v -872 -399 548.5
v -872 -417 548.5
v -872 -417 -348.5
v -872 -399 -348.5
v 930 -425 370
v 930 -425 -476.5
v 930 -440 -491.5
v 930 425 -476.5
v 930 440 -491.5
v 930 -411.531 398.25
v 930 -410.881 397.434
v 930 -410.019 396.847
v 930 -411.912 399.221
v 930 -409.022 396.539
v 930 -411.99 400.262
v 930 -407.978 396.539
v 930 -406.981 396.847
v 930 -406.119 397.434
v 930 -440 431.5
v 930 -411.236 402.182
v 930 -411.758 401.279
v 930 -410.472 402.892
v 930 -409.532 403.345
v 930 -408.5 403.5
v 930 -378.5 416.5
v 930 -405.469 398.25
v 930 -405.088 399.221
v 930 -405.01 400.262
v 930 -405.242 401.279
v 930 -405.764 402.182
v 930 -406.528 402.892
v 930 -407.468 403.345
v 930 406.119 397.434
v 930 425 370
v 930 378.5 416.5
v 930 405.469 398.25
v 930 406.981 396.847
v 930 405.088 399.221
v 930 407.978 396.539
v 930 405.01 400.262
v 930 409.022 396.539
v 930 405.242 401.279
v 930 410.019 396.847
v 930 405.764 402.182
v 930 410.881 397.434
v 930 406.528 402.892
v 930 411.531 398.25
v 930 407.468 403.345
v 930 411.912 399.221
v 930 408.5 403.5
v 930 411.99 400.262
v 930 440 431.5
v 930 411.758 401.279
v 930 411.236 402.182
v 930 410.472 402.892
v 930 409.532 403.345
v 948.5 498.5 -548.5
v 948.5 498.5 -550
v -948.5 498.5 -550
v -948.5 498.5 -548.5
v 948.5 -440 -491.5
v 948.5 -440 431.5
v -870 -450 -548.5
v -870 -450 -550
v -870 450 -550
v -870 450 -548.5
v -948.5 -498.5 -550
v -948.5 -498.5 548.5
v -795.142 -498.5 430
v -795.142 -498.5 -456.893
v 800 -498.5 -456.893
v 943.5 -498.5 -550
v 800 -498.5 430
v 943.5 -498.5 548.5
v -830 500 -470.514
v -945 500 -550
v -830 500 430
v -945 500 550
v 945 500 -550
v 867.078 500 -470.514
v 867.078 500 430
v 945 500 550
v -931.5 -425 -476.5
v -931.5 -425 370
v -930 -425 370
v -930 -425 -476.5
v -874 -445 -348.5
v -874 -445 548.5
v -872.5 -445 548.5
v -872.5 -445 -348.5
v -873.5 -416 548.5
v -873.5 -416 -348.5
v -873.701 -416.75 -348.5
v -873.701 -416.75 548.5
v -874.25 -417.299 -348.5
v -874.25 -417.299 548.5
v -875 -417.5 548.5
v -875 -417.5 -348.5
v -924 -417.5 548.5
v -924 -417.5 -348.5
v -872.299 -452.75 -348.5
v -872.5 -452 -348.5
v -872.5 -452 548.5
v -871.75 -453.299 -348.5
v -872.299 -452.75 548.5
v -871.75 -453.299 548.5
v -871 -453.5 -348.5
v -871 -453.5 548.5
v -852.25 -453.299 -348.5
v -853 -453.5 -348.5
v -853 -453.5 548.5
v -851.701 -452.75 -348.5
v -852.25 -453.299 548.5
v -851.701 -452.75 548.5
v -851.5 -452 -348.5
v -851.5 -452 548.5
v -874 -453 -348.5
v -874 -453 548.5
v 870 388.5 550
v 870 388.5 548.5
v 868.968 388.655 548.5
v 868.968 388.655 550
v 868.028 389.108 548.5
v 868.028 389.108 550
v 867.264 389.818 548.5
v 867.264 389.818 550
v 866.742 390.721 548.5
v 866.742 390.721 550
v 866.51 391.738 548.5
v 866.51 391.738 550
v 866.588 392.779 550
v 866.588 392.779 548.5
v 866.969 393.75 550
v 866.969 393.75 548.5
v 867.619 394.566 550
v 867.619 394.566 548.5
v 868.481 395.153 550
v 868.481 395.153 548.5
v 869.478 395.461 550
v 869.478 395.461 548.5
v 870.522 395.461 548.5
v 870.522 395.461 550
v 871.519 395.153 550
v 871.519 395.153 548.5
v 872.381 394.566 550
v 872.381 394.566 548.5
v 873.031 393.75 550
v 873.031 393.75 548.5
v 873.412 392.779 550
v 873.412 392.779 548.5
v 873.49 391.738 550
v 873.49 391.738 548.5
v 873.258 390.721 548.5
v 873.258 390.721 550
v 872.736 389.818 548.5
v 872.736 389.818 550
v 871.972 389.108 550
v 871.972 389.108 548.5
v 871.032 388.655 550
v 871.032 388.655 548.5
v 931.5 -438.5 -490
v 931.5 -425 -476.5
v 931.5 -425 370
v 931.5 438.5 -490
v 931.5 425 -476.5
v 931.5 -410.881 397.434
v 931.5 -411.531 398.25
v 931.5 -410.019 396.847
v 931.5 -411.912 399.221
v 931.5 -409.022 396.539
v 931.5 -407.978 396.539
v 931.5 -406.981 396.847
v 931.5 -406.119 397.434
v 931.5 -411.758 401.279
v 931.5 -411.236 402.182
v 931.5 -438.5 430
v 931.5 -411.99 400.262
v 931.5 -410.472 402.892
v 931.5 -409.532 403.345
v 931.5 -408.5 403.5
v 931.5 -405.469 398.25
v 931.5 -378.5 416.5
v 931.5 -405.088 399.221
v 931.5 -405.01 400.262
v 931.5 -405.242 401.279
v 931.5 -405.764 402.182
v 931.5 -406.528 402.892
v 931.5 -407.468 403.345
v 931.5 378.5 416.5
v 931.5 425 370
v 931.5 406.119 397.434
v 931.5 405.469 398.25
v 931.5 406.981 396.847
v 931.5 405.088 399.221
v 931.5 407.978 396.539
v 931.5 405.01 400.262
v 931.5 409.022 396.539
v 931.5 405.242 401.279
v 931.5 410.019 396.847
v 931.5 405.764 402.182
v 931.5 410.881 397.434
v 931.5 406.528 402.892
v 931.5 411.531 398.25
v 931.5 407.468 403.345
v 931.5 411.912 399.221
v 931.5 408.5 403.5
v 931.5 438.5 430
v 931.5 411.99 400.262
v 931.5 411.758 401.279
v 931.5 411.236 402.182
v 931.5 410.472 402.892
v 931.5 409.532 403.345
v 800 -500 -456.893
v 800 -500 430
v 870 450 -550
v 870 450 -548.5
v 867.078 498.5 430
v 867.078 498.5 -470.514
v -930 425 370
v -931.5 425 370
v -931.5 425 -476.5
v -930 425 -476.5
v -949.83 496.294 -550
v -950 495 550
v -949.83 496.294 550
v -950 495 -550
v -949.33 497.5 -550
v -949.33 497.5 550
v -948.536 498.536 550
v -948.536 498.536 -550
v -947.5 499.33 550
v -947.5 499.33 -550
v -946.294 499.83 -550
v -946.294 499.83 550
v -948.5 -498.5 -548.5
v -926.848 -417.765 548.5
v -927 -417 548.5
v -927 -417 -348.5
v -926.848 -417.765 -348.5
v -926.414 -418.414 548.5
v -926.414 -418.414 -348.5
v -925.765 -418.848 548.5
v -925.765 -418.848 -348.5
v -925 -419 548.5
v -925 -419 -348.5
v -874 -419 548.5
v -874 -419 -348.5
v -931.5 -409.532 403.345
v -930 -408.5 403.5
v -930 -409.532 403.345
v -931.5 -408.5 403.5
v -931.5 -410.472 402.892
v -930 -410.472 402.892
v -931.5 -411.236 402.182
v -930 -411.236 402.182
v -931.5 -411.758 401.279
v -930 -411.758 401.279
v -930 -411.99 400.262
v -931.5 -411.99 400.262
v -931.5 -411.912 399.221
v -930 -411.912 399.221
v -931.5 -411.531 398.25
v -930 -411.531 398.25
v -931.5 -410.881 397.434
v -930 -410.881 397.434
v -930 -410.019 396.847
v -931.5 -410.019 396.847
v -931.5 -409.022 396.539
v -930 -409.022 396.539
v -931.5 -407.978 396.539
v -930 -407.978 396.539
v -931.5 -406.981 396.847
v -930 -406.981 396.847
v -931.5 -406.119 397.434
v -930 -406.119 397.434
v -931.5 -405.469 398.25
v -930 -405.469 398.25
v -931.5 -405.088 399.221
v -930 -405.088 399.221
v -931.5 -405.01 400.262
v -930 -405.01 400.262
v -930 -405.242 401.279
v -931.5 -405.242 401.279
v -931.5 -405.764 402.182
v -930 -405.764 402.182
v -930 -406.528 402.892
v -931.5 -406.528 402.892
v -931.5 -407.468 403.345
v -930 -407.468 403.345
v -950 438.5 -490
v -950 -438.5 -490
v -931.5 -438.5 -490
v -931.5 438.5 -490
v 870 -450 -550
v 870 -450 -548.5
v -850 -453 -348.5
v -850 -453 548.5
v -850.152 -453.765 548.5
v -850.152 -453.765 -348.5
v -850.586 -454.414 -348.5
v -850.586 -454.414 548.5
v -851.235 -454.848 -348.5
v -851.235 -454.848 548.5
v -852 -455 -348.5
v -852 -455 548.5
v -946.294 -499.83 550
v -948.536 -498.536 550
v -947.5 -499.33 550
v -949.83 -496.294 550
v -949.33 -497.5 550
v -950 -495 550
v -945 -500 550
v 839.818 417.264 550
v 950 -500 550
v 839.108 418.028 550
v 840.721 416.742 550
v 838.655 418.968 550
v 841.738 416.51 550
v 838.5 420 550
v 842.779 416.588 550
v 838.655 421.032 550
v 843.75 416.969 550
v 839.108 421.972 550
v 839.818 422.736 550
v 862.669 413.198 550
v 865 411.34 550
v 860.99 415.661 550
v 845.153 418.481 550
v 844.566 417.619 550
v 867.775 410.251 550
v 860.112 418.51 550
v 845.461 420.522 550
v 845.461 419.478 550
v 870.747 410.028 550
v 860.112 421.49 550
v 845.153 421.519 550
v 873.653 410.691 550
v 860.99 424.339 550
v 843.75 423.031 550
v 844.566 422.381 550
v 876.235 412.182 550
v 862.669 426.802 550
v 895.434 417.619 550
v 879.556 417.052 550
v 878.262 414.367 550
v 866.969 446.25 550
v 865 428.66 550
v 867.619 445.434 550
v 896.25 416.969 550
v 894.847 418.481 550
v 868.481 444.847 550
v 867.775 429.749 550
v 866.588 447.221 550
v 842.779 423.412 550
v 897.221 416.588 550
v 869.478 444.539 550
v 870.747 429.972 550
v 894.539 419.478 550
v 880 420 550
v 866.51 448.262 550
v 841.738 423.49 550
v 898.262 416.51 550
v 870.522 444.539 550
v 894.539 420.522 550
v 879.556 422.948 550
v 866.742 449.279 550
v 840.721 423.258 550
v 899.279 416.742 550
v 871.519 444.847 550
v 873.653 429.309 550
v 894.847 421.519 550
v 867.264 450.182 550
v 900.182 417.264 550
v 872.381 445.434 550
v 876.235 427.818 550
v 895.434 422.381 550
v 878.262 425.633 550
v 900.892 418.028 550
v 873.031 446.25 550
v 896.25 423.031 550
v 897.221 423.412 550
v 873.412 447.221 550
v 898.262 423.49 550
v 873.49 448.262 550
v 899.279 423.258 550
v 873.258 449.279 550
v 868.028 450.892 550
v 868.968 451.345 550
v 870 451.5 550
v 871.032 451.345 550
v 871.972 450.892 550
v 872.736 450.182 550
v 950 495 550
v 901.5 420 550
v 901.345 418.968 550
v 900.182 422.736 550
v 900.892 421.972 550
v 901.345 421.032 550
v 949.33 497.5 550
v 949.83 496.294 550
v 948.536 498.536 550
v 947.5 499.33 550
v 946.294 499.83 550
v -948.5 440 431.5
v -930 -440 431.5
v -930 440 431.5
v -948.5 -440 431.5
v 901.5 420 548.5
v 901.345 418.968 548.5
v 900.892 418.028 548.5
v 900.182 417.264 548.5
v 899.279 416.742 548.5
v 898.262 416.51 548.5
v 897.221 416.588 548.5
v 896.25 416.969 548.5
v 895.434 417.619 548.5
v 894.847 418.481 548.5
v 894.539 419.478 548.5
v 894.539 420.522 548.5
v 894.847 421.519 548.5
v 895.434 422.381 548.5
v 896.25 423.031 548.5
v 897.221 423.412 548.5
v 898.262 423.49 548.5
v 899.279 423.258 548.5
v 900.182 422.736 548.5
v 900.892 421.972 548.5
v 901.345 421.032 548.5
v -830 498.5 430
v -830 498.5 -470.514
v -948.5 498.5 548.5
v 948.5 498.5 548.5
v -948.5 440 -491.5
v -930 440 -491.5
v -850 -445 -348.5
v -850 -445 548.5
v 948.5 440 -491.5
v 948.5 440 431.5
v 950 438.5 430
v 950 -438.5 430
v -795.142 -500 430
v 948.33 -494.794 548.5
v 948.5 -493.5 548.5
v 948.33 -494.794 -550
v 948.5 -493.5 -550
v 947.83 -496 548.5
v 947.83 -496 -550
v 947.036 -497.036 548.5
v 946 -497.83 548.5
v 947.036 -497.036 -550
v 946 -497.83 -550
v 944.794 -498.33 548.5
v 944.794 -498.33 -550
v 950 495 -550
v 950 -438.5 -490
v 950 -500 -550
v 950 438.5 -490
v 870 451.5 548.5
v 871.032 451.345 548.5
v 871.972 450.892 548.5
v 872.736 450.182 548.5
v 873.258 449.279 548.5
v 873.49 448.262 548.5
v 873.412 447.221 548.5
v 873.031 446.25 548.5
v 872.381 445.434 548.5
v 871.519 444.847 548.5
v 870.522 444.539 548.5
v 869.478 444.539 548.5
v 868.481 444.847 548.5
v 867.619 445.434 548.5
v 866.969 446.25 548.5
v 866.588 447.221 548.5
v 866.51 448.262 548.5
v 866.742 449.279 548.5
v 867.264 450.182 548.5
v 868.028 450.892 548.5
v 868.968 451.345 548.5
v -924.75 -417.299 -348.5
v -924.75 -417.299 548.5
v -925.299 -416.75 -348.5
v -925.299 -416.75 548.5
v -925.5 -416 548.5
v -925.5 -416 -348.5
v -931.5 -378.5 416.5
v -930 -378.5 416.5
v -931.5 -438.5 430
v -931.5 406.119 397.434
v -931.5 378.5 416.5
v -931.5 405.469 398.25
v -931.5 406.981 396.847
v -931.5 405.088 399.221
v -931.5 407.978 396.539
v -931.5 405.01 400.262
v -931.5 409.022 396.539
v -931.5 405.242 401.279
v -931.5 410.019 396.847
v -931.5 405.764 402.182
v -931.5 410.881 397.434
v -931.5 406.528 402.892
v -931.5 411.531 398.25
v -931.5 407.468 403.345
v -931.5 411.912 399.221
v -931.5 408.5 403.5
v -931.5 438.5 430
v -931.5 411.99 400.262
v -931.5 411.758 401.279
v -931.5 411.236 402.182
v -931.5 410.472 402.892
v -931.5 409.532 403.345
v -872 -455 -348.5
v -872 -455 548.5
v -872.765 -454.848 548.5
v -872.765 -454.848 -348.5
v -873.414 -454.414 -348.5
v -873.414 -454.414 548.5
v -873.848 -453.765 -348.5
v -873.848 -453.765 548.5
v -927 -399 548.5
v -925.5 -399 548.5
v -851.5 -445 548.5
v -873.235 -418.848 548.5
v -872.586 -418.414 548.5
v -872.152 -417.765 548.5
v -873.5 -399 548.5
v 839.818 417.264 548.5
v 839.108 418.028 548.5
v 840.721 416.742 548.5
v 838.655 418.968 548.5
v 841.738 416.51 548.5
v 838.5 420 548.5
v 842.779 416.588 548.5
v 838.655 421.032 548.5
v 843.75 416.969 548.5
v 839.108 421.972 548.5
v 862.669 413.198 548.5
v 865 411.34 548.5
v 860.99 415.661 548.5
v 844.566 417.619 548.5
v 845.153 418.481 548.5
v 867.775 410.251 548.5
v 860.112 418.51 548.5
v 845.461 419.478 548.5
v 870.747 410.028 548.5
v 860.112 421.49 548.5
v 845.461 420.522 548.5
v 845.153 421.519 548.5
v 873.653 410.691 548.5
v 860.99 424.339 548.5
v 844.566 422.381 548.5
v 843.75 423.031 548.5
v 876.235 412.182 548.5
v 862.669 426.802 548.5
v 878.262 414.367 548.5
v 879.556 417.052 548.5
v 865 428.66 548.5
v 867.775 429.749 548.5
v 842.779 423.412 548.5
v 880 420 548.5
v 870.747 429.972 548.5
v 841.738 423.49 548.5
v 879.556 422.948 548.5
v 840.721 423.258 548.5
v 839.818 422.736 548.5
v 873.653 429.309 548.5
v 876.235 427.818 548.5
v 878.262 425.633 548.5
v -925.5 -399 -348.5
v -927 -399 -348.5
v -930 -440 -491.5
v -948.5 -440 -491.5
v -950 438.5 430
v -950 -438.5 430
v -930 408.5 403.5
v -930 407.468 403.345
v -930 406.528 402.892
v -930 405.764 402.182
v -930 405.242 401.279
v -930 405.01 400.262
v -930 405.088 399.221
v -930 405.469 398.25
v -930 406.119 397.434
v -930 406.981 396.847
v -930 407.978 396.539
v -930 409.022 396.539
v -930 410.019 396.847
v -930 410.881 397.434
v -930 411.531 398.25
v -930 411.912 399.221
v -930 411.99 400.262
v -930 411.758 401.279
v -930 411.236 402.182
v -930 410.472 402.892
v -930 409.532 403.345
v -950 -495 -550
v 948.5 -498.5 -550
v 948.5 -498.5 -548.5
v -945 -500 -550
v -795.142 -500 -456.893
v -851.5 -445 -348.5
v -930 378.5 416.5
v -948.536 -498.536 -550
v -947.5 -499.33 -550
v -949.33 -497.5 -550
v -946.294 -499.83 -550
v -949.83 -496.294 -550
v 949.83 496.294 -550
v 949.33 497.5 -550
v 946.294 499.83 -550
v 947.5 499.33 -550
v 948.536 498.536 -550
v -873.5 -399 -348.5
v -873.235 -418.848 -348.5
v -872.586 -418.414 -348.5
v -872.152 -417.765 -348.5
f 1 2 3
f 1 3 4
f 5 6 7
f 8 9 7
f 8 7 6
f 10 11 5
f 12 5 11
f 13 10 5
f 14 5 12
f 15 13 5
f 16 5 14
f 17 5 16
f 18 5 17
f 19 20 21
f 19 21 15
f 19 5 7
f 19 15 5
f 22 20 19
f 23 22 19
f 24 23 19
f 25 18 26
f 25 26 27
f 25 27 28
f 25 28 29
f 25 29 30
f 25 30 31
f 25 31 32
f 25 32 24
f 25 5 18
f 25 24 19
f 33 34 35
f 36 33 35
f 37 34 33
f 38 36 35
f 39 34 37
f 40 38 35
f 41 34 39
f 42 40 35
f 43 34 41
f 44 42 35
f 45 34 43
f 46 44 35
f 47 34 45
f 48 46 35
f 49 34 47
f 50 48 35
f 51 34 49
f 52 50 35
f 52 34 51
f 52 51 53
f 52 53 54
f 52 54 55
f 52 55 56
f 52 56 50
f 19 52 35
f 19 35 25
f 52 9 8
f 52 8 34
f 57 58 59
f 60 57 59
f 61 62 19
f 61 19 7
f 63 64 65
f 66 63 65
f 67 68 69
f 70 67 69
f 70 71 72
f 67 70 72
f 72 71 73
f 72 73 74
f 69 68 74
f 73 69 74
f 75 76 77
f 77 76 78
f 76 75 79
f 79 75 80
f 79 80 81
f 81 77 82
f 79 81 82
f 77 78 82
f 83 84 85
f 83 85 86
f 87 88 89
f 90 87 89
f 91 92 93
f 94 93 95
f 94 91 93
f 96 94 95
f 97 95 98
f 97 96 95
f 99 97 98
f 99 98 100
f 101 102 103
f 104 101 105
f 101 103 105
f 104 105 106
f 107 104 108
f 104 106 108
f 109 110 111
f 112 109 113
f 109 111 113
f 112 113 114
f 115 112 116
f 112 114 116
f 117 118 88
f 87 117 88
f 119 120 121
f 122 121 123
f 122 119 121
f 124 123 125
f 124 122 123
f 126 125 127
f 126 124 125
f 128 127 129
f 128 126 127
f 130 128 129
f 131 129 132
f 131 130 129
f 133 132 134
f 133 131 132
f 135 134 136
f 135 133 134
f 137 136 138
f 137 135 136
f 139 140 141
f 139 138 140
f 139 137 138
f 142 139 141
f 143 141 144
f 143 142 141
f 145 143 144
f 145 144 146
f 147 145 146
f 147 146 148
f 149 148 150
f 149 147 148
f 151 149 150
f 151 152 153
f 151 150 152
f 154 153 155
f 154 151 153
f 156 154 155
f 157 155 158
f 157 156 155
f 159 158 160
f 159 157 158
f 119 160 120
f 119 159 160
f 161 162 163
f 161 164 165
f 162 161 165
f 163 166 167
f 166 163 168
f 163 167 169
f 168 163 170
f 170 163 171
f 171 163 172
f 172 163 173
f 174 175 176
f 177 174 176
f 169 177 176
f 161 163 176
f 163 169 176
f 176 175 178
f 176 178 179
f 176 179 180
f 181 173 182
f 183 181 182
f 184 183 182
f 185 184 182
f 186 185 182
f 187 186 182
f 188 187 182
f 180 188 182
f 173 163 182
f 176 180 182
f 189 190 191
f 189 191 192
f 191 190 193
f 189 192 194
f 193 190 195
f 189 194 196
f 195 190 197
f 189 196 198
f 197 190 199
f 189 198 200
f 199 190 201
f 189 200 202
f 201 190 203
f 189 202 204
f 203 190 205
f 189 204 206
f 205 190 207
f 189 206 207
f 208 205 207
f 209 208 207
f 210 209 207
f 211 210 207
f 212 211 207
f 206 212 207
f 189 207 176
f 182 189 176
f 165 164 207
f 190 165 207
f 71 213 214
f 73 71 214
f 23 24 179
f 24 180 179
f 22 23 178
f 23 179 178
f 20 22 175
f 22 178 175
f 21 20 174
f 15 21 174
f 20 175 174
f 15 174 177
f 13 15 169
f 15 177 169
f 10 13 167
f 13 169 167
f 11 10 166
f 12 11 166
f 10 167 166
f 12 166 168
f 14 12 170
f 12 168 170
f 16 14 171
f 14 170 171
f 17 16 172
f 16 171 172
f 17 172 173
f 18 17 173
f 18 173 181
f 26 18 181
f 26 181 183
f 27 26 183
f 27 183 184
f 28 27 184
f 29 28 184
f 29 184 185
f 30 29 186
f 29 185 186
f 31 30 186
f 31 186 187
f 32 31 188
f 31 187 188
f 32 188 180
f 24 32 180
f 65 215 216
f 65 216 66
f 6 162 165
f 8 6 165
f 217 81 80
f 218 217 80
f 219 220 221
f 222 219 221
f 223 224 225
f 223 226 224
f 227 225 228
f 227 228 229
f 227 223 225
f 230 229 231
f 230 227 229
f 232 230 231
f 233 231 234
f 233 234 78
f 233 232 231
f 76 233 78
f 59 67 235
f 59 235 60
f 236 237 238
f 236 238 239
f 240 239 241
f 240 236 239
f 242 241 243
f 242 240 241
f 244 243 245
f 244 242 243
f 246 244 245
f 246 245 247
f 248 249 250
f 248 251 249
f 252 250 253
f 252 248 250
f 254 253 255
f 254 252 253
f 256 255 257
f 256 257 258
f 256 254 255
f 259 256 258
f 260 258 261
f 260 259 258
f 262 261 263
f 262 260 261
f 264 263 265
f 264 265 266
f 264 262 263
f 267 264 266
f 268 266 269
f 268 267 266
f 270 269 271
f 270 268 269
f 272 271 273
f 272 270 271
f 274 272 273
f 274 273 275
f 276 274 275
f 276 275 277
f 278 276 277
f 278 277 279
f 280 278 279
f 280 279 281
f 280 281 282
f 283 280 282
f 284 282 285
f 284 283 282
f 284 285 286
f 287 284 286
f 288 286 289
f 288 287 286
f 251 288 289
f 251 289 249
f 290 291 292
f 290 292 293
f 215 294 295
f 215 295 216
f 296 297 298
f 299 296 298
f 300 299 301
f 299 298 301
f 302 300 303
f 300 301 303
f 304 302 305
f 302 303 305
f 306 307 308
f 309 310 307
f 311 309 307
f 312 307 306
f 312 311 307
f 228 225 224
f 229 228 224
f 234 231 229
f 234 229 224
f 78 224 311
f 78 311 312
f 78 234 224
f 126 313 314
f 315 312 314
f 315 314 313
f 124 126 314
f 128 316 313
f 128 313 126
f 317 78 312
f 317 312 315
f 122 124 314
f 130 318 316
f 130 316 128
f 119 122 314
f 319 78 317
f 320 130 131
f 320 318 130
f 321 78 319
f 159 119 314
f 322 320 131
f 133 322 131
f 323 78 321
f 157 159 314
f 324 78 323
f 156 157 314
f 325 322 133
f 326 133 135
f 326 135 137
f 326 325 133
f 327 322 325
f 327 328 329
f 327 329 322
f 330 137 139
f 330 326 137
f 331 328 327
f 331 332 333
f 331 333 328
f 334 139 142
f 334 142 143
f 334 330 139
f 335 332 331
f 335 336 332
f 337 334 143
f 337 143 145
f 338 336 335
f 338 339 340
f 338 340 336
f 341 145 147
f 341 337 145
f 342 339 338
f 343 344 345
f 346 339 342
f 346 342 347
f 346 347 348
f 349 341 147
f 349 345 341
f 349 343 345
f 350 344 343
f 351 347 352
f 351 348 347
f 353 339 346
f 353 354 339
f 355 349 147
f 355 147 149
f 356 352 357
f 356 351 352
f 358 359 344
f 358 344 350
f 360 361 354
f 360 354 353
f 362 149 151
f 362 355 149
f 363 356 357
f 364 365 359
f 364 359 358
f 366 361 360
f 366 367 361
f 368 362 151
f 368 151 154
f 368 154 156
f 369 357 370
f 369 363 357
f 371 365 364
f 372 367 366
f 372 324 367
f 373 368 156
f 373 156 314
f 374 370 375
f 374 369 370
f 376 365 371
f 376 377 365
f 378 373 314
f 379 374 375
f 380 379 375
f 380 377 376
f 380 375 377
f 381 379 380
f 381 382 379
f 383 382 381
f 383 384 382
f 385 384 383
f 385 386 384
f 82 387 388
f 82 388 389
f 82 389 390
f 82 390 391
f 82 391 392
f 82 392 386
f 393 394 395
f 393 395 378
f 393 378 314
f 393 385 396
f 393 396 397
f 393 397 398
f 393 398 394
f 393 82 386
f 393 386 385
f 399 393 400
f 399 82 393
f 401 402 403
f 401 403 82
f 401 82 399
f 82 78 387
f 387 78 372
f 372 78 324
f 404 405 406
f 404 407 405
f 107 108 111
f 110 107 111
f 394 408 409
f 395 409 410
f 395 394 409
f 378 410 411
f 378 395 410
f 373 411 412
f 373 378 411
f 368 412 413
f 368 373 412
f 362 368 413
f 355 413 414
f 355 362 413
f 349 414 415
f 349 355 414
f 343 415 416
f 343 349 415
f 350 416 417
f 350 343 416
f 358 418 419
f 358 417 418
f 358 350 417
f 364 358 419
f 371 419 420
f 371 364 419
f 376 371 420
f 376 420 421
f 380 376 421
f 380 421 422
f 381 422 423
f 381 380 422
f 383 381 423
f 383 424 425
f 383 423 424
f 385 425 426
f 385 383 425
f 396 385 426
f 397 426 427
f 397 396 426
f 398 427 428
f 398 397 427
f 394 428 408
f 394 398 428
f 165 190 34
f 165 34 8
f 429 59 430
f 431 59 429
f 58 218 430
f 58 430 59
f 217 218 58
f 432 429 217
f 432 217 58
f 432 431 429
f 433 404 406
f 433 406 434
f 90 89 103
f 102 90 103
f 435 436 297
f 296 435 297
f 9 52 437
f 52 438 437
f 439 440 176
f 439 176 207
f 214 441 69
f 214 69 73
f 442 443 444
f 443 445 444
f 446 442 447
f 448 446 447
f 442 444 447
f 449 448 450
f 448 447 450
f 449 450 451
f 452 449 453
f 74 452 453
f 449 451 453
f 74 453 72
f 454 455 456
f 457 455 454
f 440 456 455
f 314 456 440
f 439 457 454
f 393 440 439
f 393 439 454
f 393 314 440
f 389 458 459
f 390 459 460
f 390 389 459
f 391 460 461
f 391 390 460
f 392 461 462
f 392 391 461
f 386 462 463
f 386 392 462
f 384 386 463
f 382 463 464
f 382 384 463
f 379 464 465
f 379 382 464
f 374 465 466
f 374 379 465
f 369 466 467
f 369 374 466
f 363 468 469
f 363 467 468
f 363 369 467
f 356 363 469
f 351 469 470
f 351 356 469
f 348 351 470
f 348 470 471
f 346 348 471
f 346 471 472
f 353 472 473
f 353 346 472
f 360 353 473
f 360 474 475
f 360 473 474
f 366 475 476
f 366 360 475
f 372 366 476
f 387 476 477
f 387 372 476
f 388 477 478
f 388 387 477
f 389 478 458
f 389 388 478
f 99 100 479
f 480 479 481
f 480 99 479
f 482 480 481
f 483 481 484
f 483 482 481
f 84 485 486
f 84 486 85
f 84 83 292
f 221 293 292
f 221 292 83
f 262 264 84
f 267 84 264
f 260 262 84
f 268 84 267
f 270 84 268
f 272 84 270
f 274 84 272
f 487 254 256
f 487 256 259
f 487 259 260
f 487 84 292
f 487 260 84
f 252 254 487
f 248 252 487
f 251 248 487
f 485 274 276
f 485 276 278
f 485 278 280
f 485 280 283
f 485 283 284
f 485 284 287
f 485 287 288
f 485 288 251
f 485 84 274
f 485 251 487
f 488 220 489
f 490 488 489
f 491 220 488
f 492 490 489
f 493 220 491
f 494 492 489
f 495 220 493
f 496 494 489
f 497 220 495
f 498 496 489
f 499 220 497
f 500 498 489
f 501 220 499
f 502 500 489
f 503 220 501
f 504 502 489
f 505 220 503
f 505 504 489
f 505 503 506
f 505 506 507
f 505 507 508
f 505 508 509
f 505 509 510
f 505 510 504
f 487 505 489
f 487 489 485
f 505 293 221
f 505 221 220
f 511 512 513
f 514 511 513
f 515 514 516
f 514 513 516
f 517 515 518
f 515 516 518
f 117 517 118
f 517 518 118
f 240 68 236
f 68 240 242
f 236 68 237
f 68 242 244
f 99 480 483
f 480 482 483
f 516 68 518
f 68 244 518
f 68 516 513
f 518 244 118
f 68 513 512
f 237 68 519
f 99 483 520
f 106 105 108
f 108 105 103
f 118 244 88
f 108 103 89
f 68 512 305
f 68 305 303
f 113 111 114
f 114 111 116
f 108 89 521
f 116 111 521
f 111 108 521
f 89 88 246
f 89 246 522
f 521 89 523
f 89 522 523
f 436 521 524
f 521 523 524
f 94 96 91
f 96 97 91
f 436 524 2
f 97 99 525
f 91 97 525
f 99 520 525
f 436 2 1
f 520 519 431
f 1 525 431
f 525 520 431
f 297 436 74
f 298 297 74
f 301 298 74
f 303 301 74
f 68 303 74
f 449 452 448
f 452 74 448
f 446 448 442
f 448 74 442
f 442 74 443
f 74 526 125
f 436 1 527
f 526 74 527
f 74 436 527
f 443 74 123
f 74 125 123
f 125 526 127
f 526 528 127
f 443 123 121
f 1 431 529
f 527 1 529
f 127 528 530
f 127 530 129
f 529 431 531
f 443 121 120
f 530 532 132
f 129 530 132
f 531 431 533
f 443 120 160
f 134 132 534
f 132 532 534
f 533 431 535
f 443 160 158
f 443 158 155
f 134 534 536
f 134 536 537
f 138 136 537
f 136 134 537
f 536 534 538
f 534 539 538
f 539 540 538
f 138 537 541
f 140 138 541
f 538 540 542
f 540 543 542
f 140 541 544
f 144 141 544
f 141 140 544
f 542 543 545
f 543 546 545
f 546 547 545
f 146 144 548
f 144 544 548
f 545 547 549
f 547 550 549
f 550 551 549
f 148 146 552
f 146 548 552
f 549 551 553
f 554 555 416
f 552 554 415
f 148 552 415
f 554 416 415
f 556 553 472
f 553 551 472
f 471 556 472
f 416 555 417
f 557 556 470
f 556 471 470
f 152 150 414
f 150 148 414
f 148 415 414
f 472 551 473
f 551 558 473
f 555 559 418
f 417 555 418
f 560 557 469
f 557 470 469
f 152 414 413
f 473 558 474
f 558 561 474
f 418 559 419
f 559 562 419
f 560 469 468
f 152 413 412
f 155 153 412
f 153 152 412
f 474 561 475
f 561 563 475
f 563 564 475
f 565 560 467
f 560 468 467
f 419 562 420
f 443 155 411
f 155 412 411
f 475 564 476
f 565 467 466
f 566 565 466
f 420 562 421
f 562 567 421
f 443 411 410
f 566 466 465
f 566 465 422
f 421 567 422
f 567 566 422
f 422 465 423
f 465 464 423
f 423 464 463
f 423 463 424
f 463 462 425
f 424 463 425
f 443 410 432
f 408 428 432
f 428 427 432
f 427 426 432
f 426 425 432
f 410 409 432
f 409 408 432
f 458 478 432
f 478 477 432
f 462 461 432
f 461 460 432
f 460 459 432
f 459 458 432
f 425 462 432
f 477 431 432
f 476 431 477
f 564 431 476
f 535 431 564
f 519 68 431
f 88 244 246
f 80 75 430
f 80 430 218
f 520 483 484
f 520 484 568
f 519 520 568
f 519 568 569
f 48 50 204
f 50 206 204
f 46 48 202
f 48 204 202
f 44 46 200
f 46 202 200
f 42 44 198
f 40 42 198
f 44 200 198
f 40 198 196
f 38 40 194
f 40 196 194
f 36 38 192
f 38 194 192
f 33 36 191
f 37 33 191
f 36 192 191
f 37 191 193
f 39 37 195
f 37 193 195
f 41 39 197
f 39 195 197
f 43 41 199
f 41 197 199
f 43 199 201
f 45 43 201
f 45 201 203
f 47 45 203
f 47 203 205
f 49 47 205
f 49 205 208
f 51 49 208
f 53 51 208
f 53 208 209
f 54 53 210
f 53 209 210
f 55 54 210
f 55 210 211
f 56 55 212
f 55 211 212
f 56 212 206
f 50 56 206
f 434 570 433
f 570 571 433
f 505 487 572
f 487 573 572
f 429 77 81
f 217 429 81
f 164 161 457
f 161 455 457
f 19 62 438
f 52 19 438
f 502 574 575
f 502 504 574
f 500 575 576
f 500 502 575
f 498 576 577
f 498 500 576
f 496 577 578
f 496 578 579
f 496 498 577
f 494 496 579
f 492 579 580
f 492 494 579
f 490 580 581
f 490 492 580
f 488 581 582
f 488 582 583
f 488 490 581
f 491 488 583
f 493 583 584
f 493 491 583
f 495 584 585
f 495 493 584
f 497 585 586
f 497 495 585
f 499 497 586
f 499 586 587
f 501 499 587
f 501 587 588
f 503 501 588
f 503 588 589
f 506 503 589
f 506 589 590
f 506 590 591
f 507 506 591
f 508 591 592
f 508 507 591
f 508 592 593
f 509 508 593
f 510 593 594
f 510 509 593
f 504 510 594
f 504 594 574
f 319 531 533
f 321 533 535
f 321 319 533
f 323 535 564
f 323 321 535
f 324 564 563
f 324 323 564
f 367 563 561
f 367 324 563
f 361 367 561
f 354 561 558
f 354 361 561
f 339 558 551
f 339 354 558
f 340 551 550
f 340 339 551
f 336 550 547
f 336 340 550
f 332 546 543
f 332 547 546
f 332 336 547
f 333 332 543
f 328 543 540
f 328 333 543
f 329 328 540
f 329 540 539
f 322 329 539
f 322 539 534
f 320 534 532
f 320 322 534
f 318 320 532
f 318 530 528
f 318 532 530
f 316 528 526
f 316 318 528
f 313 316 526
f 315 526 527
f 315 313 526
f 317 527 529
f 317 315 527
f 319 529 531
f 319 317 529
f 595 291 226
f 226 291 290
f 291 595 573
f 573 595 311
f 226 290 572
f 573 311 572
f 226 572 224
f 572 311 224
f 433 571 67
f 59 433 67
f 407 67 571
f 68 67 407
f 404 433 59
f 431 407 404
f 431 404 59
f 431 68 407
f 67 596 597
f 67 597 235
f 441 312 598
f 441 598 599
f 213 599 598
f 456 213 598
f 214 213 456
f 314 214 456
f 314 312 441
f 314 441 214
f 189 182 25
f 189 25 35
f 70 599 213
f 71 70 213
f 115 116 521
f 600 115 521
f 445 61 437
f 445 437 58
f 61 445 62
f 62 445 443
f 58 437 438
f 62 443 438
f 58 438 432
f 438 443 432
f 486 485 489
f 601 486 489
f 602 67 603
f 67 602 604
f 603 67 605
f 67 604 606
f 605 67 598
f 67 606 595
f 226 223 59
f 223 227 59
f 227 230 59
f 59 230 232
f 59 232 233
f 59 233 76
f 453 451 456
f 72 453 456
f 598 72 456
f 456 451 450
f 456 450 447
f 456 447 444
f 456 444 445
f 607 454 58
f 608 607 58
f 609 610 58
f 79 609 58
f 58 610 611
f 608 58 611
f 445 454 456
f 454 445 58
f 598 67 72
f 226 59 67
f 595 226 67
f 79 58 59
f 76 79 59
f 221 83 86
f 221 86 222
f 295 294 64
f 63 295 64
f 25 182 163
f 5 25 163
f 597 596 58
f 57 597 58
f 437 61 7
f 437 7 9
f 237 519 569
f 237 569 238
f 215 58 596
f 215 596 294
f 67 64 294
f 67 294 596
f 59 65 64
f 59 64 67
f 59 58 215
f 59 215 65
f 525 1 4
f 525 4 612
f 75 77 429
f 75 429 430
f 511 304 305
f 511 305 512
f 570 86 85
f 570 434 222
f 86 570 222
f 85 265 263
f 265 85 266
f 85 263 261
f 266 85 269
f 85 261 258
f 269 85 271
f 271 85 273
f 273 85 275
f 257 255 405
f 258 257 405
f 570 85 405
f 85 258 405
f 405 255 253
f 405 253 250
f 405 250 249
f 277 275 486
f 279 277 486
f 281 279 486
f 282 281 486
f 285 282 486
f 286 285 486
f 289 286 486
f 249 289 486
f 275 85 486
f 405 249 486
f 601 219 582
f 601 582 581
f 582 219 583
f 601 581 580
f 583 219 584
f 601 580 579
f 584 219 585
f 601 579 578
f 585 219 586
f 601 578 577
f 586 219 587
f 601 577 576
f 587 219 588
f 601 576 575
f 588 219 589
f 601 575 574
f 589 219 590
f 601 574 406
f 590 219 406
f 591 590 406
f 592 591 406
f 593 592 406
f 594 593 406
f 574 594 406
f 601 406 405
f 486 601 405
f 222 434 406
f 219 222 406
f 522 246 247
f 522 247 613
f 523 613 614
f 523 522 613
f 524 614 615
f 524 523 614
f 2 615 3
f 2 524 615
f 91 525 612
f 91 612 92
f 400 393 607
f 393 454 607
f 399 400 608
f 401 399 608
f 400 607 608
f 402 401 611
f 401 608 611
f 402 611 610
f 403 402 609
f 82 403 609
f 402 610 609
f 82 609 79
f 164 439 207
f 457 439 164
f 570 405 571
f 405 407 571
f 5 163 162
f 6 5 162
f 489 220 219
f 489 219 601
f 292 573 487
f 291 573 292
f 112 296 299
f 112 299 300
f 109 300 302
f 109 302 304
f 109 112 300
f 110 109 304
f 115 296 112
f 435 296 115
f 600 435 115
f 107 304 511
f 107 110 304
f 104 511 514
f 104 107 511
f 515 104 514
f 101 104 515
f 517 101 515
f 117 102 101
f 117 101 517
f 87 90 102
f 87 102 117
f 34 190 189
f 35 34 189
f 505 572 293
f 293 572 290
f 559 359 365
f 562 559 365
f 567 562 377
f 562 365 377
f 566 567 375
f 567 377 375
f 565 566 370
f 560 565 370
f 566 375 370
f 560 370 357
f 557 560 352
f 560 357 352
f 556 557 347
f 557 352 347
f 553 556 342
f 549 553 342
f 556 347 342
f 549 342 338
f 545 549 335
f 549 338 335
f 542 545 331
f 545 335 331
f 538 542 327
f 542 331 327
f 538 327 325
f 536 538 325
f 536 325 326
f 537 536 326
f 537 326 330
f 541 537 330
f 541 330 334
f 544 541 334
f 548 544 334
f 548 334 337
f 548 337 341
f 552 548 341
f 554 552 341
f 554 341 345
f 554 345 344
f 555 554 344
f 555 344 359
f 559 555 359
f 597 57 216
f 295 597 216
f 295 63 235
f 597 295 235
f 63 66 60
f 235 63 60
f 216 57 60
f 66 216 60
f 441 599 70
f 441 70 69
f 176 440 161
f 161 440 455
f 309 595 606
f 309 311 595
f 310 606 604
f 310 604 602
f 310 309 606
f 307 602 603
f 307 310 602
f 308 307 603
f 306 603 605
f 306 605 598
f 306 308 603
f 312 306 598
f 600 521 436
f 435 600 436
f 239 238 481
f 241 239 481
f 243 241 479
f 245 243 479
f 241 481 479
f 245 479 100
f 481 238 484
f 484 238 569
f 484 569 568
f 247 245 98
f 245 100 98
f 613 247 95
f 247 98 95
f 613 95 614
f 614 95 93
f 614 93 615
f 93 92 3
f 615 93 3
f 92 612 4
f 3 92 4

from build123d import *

# Parameters (mm, degrees)
SKETCH_1_W                     = 1900
SKETCH_1_H                     = 1000
EXTRUDE_1_DEPTH                = 550
SHELL_1_T                      = -1.5
SKETCH_2_W                     = 1897
SKETCH_2_H                     = 997
SKETCH_2_W_2                   = 1740
SKETCH_2_H_2                   = 900
EXTRUDE_2_DEPTH                = 1.5
FILLET_1_R                     = 5
SKETCH_9_R                     = 10
CUT_EXTRUDE_3_DEPTH            = 10
SKETCH_10_W                    = 1697.078401096
SKETCH_10_H                    = 900.514037569
CUT_EXTRUDE_4_DEPTH            = 20
SKETCH_18_W                    = 920
SKETCH_18_H                    = 877
CUT_EXTRUDE_5_DEPTH            = 1.5
SKETCH_34_W                    = 923
SKETCH_34_H                    = 880
SKETCH_34_W_2                  = 920
SKETCH_34_H_2                  = 877
EXTRUDE_6_DEPTH                = 17
SKETCH_35_W                    = 923
SKETCH_35_H                    = 880
SKETCH_35_W_2                  = 893
SKETCH_35_H_2                  = 850
EXTRUDE_7_DEPTH                = 1.5
EXTRUDE_8_DEPTH                = 1.5
HOLE_WIZARD_7_0_7_1_AT_2_COUNT = 2
HOLE_WIZARD_7_0_7_1_AT_2_PITCH = 817
EXTRUDE_9_DEPTH                = 897
EXTRUDE_10_DEPTH               = 897
PATTERN_CIRCULAR_2_COUNT       = 4
SKETCH_84_W                    = 1595.14155231
SKETCH_84_H                    = 886.893477963
CUT_EXTRUDE_22_DEPTH           = 10


with BuildPart() as part:
    # 草图1 → 凸台-拉伸1 (new body, symmetric)
    with BuildSketch(Plane.XY):
        Rectangle(SKETCH_1_W, SKETCH_1_H)
    extrude(amount=EXTRUDE_1_DEPTH, both=True)

    # 抽壳1
    shell_1_openings = [part.faces().sort_by_distance(p)[0] for p in [
        (0, 0, -550),
    ]]
    offset(amount=SHELL_1_T, openings=shell_1_openings, kind=Kind.INTERSECTION)

    # 圆角1
    fillet_1_edges = [part.edges().sort_by_distance(p)[0] for p in [
        (948.5, -498.5, -0.75),
        (-950, 500, 0),
        (950, 500, 0),
        (-950, -500, 0),
    ]]
    fillet(fillet_1_edges, radius=FILLET_1_R)

    # 草图9 → 切除-拉伸3 (cut)
    with BuildSketch(Plane.XY.offset(550)):
        with Locations((870, 420)):
            Circle(SKETCH_9_R)
    extrude(amount=-CUT_EXTRUDE_3_DEPTH, mode=Mode.SUBTRACT)

    # 草图10 → 切除-拉伸4 (cut)
    with BuildSketch(Plane(origin=(0, 500, 0), x_dir=(1, 0, 0), z_dir=(0, 1, 0))):
        with Locations((18.539200548, 20.257018785)):
            Rectangle(SKETCH_10_W, SKETCH_10_H)
    extrude(amount=-CUT_EXTRUDE_4_DEPTH, mode=Mode.SUBTRACT)

    # 草图18 → 切除-拉伸5 (cut)
    with BuildSketch(Plane.ZY.offset(950)):
        with Locations((-30, 0)):
            Rectangle(SKETCH_18_W, SKETCH_18_H)
    cut_extrude_5 = extrude(amount=-CUT_EXTRUDE_5_DEPTH, mode=Mode.SUBTRACT)

    # 草图34 → 凸台-拉伸6 (add)
    with BuildSketch(Plane(origin=(-948.5, 0, 0), x_dir=(0, 0, -1), z_dir=(1, 0, 0))):
        with Locations((30, 0)):
            Rectangle(SKETCH_34_W, SKETCH_34_H)
        with Locations((30, 0)):
            Rectangle(SKETCH_34_W_2, SKETCH_34_H_2, mode=Mode.SUBTRACT)
    extrude_6 = extrude(amount=EXTRUDE_6_DEPTH)

    # 草图35 → 凸台-拉伸7 (add)
    with BuildSketch(Plane(origin=(-931.5, 0, 0), x_dir=(0, 0, -1), z_dir=(1, 0, 0))):
        with Locations((30, 0)):
            Rectangle(SKETCH_35_W, SKETCH_35_H)
        with Locations((30, 0)):
            Rectangle(SKETCH_35_W_2, SKETCH_35_H_2, mode=Mode.SUBTRACT)
    extrude_7 = extrude(amount=EXTRUDE_7_DEPTH)

    # 草图36 → 凸台-拉伸8 (add)
    with BuildSketch(Plane.ZY.offset(931.5)):
        Polygon((370, 425), (416.5, 378.5), (416.5, 425), align=None)
        Polygon((416.5, -378.5), (370, -425), (416.5, -425), align=None)
    extrude_8 = extrude(amount=-EXTRUDE_8_DEPTH)

    # 草图37 → Ø7.0 (7) 直径孔1 (revolve, cut)
    with BuildSketch(Plane(origin=(-931.5, 408.5, 400), x_dir=(0, 0, 1), z_dir=(0, 1, 0))):
        Polygon((0, 0), (0, 3.603012167), (3.5, 1.5), (3.5, 0), align=None)
    hole_wizard_7_0_7_1 = revolve(axis=Axis((-937.85, 408.5, 400), (1, 0, 0)), mode=Mode.SUBTRACT)

    # Ø7.0 (7) 直径孔1 at 2: Ø7.0 (7) 直径孔1 ×2
    with Locations(*[(0, -i * HOLE_WIZARD_7_0_7_1_AT_2_PITCH, 0) for i in range(1, HOLE_WIZARD_7_0_7_1_AT_2_COUNT)]):
        add(hole_wizard_7_0_7_1, mode=Mode.SUBTRACT)

    # 镜向4: 切除-拉伸5 across plane
    add(cut_extrude_5.mirror(Plane(origin=(0, 0, 0), x_dir=(0, 0, 1), z_dir=(1, 0, 0))), mode=Mode.SUBTRACT)

    # 镜向7: 凸台-拉伸6 across plane
    add(extrude_6.mirror(Plane(origin=(0, 0, 0), x_dir=(0, 0, 1), z_dir=(1, 0, 0))))

    # 镜向8: 凸台-拉伸7 across plane
    add(extrude_7.mirror(Plane(origin=(0, 0, 0), x_dir=(0, 0, 1), z_dir=(1, 0, 0))))

    # 镜向10: 凸台-拉伸8 across plane
    add(extrude_8.mirror(Plane(origin=(0, 0, 0), x_dir=(0, 0, 1), z_dir=(1, 0, 0))))

    # 镜向11: Ø7.0 (7) 直径孔1 across plane
    add(hole_wizard_7_0_7_1.mirror(Plane(origin=(0, 0, 0), x_dir=(0, 0, 1), z_dir=(1, 0, 0))), mode=Mode.SUBTRACT)

    # 镜向11 copy 1 sketch → 镜向11 copy 1 (revolve, cut)
    with BuildSketch(Plane(origin=(931.5, -408.5, 400), x_dir=(0, 0, 1), z_dir=(0, 1, 0))):
        Polygon((0, 0), (0, -3.603012167), (3.5, -1.5), (3.5, 0), align=None)
    revolve(axis=Axis((937.85, -408.5, 400), (1, 0, 0)), mode=Mode.SUBTRACT)

    # 草图53 → 凸台-拉伸9 (add)
    with BuildSketch(Plane(origin=(0, 0, 548.5), x_dir=(-1, 0, 0), z_dir=(0, 0, -1))):
        with BuildLine():
            Line((850, -445), (850, -453))
            ThreePointArc((850, -453), (850.585786438, -454.414213562), (852, -455))
            Line((852, -455), (872, -455))
            ThreePointArc((872, -455), (873.414213562, -454.414213562), (874, -453))
            Line((874, -453), (874, -445))
            Line((874, -445), (872.5, -445))
            Line((872.5, -445), (872.5, -452))
            ThreePointArc((872.5, -452), (872.060660172, -453.060660172), (871, -453.5))
            Line((871, -453.5), (853, -453.5))
            ThreePointArc((853, -453.5), (851.939339828, -453.060660172), (851.5, -452))
            Line((851.5, -452), (851.5, -445))
            Line((851.5, -445), (850, -445))
        make_face()
    extrude(amount=EXTRUDE_9_DEPTH)

    # 草图54 → 凸台-拉伸10 (add)
    with BuildSketch(Plane(origin=(0, 0, 548.5), x_dir=(-1, 0, 0), z_dir=(0, 0, -1))):
        with BuildLine():
            Line((927, -399), (927, -417))
            ThreePointArc((927, -417), (926.414213562, -418.414213562), (925, -419))
            Line((925, -419), (874, -419))
            ThreePointArc((874, -419), (872.585786438, -418.414213562), (872, -417))
            Line((872, -417), (872, -399))
            Line((872, -399), (873.5, -399))
            Line((873.5, -399), (873.5, -416))
            ThreePointArc((873.5, -416), (873.939339828, -417.060660172), (875, -417.5))
            Line((875, -417.5), (924, -417.5))
            ThreePointArc((924, -417.5), (925.060660172, -417.060660172), (925.5, -416))
            Line((925.5, -416), (925.5, -399))
            Line((925.5, -399), (927, -399))
        make_face()
    extrude(amount=EXTRUDE_10_DEPTH)

    # 草图56 → Ø7.0 (7) 直径孔3 (revolve, cut)
    with BuildSketch(Plane(origin=(870, 392, 550), x_dir=(0, -1, 0), z_dir=(1, 0, 0))):
        Polygon((0, 0), (0, 4.103012167), (3.5, 2), (3.5, 0), align=None)
    hole_wizard_7_0_7_3 = revolve(axis=Axis((870, 392, 556.35), (0, 0, -1)), mode=Mode.SUBTRACT)

    # 阵列(圆周)2: Ø7.0 (7) 直径孔3 ×4 about axis
    pattern_circular_2_axis = Axis((870, 420, 0), (0, 0, 1))
    for i in range(1, PATTERN_CIRCULAR_2_COUNT):
        add(hole_wizard_7_0_7_3.rotate(pattern_circular_2_axis, i * 360 / PATTERN_CIRCULAR_2_COUNT), mode=Mode.SUBTRACT)

    # 草图84 → 切除-拉伸22 (cut)
    with BuildSketch(Plane.XZ.offset(500)):
        with Locations((2.429223845, -13.446738982)):
            Rectangle(SKETCH_84_W, SKETCH_84_H)
    extrude(amount=-CUT_EXTRUDE_22_DEPTH, mode=Mode.SUBTRACT)


with BuildPart() as body_2:
    # 草图2 → 凸台-拉伸2 (new body)
    with BuildSketch(Plane(origin=(0, 0, -550), x_dir=(-1, 0, 0), z_dir=(0, 0, -1))):
        Rectangle(SKETCH_2_W, SKETCH_2_H)
        Rectangle(SKETCH_2_W_2, SKETCH_2_H_2, mode=Mode.SUBTRACT)
    extrude(amount=-EXTRUDE_2_DEPTH)


solid = Compound([part.part, body_2.part])
